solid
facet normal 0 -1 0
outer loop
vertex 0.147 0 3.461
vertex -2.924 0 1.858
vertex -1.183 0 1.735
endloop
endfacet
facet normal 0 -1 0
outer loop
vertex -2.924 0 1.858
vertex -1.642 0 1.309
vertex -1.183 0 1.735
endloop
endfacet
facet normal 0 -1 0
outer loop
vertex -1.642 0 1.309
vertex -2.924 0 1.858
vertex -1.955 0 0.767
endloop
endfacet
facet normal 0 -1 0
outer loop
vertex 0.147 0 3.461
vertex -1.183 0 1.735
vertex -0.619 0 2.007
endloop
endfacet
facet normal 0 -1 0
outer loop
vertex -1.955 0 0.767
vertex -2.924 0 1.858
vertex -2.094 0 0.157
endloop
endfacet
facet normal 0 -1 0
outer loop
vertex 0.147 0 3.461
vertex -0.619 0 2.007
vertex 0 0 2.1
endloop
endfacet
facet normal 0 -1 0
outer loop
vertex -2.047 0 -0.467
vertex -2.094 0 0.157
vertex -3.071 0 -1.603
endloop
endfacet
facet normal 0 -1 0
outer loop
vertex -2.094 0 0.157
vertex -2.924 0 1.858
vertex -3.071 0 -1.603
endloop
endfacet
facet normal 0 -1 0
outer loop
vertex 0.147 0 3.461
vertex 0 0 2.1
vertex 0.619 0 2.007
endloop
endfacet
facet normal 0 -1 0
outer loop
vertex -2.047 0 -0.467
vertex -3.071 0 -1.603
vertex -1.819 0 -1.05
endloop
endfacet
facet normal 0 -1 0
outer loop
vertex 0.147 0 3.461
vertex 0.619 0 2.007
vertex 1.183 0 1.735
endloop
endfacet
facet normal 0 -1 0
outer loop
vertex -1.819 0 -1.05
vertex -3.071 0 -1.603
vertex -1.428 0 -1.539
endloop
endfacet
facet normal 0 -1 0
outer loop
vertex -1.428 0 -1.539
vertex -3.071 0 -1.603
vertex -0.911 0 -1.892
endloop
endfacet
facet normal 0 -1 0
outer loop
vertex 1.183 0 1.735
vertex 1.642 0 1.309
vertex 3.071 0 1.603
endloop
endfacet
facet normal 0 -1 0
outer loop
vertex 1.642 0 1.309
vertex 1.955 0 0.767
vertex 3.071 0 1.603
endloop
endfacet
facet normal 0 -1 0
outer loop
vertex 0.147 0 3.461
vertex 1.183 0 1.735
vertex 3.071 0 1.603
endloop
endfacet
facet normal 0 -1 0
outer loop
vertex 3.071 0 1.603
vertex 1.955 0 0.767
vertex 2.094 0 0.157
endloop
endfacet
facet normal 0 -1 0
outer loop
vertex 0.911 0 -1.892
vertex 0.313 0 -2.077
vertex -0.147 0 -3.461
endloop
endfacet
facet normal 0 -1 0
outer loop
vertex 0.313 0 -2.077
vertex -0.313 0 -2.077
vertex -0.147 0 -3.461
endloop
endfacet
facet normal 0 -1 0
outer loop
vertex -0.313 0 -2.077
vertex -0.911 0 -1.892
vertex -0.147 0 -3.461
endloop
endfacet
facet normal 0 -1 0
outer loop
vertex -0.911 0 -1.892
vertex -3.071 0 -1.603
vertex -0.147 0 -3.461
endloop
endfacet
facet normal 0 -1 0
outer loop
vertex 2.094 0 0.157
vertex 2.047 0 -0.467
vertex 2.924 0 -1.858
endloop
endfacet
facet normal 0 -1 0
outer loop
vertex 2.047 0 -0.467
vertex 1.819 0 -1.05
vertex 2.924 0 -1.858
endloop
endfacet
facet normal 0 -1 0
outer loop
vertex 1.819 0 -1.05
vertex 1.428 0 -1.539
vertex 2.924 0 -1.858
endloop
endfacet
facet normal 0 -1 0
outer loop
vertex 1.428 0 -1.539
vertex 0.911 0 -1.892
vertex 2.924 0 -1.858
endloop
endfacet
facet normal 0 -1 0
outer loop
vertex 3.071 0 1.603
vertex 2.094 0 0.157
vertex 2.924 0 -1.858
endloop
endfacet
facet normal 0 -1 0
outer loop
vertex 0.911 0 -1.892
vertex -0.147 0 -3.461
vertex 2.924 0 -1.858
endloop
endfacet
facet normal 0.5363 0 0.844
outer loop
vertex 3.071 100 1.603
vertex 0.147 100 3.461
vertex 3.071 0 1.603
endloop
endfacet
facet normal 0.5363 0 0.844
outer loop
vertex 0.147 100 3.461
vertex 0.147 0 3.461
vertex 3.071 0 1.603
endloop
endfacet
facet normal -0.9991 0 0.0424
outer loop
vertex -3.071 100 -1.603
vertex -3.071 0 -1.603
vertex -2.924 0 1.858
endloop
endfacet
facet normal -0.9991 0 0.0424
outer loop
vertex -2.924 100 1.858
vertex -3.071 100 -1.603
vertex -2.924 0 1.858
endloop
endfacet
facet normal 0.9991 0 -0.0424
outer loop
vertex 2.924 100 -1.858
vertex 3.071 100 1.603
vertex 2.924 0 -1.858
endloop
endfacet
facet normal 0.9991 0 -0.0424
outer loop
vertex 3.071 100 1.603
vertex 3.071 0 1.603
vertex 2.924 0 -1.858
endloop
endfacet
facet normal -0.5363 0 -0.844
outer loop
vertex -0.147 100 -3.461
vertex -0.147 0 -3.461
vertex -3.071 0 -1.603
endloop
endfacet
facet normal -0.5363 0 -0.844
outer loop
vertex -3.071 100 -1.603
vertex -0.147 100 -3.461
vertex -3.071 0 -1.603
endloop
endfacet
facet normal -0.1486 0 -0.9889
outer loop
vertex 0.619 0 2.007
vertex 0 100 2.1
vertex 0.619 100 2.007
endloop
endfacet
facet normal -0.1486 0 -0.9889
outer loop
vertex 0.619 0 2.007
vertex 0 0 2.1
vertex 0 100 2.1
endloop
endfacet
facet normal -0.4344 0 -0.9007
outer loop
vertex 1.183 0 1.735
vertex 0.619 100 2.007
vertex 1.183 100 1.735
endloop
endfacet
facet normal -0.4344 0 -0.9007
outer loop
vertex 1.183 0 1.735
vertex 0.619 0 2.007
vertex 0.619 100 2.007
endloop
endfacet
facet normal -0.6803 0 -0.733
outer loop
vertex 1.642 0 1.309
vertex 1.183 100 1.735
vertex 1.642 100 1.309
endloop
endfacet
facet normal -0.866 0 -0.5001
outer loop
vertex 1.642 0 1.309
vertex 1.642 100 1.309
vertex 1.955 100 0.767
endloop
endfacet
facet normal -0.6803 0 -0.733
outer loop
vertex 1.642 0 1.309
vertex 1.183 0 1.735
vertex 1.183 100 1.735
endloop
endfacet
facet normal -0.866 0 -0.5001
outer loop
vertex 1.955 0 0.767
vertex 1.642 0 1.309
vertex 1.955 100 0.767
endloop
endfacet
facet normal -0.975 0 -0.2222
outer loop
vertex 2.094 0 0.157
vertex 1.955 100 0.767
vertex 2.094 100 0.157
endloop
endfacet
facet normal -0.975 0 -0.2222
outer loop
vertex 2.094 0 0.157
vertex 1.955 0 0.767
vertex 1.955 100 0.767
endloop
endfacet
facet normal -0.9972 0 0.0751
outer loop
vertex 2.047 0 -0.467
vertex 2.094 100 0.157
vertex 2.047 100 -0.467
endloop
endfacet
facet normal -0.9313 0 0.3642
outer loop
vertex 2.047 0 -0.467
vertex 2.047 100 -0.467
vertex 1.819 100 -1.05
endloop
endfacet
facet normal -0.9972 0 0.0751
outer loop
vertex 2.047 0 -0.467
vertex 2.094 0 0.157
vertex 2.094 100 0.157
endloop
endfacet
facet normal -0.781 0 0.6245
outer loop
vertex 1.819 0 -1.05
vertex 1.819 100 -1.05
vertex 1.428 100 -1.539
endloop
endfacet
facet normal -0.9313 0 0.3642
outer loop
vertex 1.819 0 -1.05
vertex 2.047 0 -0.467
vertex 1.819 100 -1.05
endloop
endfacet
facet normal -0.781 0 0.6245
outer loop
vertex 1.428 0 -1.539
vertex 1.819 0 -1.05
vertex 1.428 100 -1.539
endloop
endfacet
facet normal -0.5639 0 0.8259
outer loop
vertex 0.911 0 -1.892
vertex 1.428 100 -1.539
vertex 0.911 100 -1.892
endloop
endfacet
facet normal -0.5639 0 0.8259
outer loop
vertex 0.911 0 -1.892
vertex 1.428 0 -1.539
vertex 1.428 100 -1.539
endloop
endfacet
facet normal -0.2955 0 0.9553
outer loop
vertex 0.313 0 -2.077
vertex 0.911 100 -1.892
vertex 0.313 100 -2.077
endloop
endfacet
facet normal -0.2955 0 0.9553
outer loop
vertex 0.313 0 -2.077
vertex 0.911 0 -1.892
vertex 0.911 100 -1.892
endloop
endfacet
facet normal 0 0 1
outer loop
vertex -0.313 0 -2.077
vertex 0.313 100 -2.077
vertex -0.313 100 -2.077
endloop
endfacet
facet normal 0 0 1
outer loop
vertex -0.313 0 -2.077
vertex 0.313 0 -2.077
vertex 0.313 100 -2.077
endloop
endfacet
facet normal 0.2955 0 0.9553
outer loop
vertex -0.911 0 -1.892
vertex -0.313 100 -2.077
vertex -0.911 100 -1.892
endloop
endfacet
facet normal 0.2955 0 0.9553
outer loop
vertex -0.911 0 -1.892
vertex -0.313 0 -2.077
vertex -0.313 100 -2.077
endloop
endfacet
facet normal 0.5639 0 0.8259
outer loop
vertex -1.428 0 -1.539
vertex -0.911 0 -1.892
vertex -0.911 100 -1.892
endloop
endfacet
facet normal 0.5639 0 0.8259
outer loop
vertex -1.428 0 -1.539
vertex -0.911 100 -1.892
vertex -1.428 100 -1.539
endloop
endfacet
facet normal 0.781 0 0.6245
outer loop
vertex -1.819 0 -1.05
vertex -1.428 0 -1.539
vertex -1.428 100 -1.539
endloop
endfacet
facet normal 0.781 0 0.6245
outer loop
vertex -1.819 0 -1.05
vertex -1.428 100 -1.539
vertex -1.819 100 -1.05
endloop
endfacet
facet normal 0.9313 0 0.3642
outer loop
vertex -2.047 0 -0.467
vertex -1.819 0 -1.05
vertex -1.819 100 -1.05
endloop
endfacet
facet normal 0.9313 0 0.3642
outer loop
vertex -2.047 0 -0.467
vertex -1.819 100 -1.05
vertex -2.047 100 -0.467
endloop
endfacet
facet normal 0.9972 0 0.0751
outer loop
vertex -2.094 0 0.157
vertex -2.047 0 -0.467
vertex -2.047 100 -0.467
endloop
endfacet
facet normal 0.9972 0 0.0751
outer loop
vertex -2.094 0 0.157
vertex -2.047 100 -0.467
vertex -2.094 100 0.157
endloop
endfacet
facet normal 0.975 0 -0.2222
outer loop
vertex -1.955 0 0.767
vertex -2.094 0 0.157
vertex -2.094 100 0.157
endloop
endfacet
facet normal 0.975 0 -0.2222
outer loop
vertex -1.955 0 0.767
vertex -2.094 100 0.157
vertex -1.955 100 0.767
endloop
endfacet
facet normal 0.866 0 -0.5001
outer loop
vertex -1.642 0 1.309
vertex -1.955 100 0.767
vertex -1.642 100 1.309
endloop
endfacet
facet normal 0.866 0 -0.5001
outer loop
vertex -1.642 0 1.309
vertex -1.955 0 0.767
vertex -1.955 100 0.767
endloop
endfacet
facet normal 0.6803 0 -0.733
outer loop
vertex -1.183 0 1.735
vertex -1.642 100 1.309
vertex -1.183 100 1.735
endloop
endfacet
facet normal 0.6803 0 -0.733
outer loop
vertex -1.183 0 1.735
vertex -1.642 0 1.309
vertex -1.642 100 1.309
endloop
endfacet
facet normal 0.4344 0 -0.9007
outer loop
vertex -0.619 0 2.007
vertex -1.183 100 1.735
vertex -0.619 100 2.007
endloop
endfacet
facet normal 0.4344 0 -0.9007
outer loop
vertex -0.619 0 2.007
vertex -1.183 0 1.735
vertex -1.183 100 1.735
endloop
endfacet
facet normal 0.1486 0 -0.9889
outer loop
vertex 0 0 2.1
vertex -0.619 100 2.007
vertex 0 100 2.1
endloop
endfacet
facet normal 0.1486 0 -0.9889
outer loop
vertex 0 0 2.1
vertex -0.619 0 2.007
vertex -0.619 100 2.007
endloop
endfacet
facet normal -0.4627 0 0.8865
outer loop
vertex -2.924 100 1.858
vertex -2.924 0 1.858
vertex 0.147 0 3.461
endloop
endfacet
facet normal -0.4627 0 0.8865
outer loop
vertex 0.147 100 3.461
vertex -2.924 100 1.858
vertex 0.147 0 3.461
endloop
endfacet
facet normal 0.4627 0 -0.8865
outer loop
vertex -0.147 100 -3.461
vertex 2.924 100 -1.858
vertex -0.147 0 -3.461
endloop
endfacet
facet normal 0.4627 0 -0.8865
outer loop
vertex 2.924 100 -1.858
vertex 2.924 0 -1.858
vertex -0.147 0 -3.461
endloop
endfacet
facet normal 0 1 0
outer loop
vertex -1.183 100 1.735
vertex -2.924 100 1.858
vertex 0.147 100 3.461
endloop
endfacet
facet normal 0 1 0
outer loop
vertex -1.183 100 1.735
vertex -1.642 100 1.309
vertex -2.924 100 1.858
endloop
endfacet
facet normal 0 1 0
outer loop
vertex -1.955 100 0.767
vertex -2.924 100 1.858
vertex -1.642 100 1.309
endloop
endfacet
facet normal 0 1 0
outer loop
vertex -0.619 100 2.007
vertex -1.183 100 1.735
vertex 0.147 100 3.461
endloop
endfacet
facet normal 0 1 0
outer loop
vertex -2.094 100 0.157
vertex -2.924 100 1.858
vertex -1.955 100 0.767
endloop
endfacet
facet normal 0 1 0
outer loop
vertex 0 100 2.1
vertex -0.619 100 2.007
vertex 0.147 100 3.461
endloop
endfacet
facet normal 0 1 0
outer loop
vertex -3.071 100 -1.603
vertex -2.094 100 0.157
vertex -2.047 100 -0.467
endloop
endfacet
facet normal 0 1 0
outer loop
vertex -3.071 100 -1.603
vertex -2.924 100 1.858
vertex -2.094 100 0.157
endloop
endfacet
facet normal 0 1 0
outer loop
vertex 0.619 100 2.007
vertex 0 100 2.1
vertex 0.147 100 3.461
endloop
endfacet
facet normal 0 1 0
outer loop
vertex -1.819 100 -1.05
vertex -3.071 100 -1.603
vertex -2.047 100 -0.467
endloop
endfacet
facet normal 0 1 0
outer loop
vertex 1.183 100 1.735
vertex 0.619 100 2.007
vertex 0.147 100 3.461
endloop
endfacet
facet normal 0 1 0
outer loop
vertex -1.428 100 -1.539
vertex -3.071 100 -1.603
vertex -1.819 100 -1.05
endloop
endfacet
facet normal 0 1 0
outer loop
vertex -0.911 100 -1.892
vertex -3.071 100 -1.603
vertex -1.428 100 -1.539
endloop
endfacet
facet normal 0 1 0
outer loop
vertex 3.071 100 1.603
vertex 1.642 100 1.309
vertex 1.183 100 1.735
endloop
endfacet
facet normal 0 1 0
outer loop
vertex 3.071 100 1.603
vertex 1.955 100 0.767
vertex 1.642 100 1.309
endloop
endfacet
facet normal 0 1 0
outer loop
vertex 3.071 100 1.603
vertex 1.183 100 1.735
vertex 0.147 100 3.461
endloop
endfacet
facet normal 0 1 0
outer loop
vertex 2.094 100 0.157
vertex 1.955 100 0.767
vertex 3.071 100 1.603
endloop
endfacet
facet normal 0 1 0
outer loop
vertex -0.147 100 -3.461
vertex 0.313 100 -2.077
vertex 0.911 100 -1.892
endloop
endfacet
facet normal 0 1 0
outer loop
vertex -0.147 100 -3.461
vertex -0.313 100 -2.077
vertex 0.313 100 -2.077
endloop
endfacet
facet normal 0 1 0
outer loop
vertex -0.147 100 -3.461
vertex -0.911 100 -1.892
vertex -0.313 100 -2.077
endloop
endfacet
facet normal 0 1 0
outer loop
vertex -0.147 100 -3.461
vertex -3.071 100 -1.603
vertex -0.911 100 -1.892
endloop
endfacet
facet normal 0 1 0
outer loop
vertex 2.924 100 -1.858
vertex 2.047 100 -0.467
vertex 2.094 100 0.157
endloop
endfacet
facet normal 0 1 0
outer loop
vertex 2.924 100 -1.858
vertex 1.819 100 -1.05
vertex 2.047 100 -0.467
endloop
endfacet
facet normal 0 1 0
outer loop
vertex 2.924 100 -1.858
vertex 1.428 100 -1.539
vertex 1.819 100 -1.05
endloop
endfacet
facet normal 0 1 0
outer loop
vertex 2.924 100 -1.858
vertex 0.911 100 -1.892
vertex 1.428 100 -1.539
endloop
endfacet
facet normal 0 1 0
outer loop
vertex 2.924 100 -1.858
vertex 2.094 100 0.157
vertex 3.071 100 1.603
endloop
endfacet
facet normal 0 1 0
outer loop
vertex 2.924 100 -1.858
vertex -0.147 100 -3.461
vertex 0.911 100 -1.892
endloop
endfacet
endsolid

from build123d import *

# Parameters (mm, degrees)
SKETCH_1_R      = 2.1
EXTRUDE_1_DEPTH = 60
SKETCH_2_R      = 2.1
EXTRUDE_2_DEPTH = 40


with BuildPart() as part:
    # 草图1 → 凸台-拉伸1 (new body)
    with BuildSketch(Plane(origin=(0, 0, 0), x_dir=(1, 0, 0), z_dir=(0, 1, 0))):
        Polygon((3.070700034, -1.603371853), (2.923910774, 1.85761831), (-0.14678926, 3.460990164), (-3.070700034, 1.603371853), (-2.923910774, -1.85761831), (0.14678926, -3.460990164), align=None)
        with Locations(Location((0, 0, 0), (0, 0, 270))):
            Circle(SKETCH_1_R, mode=Mode.SUBTRACT)
    extrude(amount=EXTRUDE_1_DEPTH)

    # 草图2 → 凸台-拉伸2 (add)
    with BuildSketch(Plane(origin=(0, 60, 0), x_dir=(1, 0, 0), z_dir=(0, 1, 0))):
        Polygon((-2.923910774, -1.85761831), (0.14678926, -3.460990164), (3.070700034, -1.603371853), (2.923910774, 1.85761831), (-0.14678926, 3.460990164), (-3.070700034, 1.603371853), align=None)
        with Locations(Location((0, 0, 0), (0, 0, 270))):
            Circle(SKETCH_2_R, mode=Mode.SUBTRACT)
    extrude(amount=EXTRUDE_2_DEPTH)


solid = part.part
